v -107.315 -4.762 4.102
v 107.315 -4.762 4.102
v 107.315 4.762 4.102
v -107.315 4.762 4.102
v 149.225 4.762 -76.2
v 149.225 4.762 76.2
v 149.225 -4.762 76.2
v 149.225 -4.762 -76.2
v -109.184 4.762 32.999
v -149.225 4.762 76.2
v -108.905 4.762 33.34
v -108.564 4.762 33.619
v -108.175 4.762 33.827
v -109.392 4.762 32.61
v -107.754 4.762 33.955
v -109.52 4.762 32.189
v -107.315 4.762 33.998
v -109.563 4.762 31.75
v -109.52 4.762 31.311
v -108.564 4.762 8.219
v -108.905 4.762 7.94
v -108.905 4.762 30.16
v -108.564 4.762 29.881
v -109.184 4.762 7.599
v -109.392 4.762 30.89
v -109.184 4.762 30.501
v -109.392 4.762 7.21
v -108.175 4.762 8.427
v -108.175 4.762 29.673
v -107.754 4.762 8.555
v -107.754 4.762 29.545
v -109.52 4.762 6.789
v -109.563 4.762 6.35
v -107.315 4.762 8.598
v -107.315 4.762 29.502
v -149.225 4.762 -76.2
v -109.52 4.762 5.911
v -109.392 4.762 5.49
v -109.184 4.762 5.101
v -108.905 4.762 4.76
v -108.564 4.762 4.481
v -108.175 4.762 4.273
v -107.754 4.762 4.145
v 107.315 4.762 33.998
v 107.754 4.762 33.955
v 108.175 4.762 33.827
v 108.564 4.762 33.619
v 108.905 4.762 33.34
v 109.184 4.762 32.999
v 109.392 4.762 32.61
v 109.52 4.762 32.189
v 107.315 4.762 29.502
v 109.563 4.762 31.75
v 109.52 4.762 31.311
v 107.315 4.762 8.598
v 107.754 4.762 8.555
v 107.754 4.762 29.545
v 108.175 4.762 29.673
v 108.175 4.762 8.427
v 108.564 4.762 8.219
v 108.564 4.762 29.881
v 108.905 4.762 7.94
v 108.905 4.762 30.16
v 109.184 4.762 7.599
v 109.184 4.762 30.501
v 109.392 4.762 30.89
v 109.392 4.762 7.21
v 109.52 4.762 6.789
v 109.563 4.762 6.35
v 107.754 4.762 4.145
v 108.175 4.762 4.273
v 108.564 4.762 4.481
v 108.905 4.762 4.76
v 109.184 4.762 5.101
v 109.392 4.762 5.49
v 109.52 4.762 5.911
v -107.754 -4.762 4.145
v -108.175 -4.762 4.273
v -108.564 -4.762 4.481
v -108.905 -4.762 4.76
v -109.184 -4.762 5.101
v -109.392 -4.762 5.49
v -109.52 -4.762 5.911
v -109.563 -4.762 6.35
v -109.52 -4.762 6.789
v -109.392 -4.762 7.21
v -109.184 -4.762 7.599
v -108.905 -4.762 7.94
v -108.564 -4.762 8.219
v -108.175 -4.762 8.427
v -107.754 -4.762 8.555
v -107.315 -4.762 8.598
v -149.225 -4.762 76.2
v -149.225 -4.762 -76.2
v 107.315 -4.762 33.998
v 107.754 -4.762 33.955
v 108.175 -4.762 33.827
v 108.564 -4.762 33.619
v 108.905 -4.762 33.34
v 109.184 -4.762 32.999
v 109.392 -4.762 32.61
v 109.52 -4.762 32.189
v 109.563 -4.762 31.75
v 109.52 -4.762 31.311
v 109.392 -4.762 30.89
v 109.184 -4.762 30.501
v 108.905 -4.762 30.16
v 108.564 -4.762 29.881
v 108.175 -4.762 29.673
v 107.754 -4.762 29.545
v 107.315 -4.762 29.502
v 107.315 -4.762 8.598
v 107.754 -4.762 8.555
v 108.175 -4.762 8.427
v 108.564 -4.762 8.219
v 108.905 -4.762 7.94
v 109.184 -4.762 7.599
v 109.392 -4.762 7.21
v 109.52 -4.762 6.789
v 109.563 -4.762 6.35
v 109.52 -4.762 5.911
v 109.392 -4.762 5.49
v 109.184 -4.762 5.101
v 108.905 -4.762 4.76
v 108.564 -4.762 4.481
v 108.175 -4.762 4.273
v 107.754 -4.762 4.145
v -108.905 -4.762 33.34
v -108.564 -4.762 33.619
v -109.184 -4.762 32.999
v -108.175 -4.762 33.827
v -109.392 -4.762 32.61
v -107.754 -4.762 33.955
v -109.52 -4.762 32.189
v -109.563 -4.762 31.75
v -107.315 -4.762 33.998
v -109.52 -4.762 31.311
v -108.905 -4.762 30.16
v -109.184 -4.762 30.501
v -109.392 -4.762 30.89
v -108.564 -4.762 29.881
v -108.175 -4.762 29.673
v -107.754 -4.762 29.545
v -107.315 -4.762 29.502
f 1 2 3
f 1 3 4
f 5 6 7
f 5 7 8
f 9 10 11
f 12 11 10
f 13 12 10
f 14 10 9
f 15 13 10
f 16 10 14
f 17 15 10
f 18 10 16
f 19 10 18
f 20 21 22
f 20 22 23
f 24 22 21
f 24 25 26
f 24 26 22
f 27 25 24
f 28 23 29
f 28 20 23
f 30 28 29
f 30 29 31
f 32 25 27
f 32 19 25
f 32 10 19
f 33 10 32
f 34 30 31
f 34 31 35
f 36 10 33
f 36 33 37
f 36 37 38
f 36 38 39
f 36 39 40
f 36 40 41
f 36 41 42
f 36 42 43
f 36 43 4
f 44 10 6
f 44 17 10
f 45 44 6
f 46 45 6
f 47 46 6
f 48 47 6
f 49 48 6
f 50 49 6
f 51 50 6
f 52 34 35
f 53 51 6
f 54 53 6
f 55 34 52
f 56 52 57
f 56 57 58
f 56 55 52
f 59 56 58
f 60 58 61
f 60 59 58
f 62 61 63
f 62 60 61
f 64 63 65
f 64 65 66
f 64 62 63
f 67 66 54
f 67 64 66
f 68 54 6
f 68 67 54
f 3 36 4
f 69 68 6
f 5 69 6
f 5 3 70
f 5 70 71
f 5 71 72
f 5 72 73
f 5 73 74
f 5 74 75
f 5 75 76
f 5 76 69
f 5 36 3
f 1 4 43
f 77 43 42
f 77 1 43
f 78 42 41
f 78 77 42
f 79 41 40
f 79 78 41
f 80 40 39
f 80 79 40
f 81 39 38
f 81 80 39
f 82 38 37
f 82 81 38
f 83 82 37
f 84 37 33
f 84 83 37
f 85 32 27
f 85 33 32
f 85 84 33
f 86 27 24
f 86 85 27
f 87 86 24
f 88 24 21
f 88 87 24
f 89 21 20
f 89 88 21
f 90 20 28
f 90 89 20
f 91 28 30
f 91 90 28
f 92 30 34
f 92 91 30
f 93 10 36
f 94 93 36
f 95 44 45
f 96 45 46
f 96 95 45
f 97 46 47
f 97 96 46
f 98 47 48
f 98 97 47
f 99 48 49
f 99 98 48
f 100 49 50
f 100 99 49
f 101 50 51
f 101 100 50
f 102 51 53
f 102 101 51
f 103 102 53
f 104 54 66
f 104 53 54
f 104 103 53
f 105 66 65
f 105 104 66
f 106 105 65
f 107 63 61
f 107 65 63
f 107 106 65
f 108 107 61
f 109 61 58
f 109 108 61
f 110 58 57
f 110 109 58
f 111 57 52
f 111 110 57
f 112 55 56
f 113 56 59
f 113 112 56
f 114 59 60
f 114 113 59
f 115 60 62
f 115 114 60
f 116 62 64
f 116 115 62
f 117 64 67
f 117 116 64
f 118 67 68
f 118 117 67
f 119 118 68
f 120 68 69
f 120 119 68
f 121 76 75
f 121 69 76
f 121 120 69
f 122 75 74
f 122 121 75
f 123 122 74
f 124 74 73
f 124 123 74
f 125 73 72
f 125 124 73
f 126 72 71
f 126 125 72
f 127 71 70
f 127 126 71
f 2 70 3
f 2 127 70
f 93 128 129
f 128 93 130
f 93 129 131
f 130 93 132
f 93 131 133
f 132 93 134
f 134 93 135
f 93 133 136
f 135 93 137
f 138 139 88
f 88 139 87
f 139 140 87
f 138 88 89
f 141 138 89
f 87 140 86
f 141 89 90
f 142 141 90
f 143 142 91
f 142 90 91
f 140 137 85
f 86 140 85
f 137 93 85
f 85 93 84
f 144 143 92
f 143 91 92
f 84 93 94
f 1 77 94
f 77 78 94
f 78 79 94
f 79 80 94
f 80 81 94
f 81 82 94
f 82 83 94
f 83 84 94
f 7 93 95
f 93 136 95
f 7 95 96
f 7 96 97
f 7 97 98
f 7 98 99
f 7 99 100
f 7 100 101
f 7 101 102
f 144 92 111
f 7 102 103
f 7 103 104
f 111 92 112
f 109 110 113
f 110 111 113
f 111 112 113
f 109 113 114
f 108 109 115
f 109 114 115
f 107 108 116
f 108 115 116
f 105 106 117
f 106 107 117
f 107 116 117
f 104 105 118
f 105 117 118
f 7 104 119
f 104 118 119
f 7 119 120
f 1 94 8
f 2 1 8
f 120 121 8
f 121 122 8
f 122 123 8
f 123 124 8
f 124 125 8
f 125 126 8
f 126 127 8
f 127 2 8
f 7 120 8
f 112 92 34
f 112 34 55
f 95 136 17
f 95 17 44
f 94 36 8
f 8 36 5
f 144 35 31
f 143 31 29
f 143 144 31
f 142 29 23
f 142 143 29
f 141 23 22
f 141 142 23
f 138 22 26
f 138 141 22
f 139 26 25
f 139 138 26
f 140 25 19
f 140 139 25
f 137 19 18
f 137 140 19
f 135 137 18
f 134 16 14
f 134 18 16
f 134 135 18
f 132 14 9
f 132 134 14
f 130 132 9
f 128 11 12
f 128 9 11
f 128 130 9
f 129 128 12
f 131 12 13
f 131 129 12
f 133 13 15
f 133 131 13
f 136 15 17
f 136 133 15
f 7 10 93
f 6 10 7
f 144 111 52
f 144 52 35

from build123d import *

# Parameters (mm, degrees)
SKETCH1_W           = 298.45
SKETCH1_H           = 152.4
BOSS_EXTRUDE1_DEPTH = 4.7625
CUT_EXTRUDE2_DEPTH  = 168.825106137


with BuildPart() as part:
    # Sketch1 → Boss-Extrude1 (new, symmetric)
    with BuildSketch(Plane(origin=(0, 0, 0), x_dir=(1, 0, 0), z_dir=(0, 1, 0))):
        Rectangle(SKETCH1_W, SKETCH1_H)
    extrude(amount=BOSS_EXTRUDE1_DEPTH, both=True)

    # Sketch4 → Cut-Extrude2 (cut, through all)
    with BuildSketch(Plane.XZ.offset(4.7625)):
        with BuildLine():
            Line((-107.315, 33.9979), (107.315, 33.9979))
            ThreePointArc((107.315, 33.9979), (109.5629, 31.75), (107.315, 29.5021))
            Line((107.315, 29.5021), (-107.315, 29.5021))
            ThreePointArc((-107.315, 29.5021), (-109.5629, 31.75), (-107.315, 33.9979))
        make_face()
        with BuildLine():
            Line((-107.315, 8.5979), (107.315, 8.5979))
            ThreePointArc((107.315, 8.5979), (109.5629, 6.35), (107.315, 4.1021))
            Line((107.315, 4.1021), (-107.315, 4.1021))
            ThreePointArc((-107.315, 4.1021), (-109.5629, 6.35), (-107.315, 8.5979))
        make_face()
    extrude(amount=-CUT_EXTRUDE2_DEPTH, mode=Mode.SUBTRACT)


solid = part.part
